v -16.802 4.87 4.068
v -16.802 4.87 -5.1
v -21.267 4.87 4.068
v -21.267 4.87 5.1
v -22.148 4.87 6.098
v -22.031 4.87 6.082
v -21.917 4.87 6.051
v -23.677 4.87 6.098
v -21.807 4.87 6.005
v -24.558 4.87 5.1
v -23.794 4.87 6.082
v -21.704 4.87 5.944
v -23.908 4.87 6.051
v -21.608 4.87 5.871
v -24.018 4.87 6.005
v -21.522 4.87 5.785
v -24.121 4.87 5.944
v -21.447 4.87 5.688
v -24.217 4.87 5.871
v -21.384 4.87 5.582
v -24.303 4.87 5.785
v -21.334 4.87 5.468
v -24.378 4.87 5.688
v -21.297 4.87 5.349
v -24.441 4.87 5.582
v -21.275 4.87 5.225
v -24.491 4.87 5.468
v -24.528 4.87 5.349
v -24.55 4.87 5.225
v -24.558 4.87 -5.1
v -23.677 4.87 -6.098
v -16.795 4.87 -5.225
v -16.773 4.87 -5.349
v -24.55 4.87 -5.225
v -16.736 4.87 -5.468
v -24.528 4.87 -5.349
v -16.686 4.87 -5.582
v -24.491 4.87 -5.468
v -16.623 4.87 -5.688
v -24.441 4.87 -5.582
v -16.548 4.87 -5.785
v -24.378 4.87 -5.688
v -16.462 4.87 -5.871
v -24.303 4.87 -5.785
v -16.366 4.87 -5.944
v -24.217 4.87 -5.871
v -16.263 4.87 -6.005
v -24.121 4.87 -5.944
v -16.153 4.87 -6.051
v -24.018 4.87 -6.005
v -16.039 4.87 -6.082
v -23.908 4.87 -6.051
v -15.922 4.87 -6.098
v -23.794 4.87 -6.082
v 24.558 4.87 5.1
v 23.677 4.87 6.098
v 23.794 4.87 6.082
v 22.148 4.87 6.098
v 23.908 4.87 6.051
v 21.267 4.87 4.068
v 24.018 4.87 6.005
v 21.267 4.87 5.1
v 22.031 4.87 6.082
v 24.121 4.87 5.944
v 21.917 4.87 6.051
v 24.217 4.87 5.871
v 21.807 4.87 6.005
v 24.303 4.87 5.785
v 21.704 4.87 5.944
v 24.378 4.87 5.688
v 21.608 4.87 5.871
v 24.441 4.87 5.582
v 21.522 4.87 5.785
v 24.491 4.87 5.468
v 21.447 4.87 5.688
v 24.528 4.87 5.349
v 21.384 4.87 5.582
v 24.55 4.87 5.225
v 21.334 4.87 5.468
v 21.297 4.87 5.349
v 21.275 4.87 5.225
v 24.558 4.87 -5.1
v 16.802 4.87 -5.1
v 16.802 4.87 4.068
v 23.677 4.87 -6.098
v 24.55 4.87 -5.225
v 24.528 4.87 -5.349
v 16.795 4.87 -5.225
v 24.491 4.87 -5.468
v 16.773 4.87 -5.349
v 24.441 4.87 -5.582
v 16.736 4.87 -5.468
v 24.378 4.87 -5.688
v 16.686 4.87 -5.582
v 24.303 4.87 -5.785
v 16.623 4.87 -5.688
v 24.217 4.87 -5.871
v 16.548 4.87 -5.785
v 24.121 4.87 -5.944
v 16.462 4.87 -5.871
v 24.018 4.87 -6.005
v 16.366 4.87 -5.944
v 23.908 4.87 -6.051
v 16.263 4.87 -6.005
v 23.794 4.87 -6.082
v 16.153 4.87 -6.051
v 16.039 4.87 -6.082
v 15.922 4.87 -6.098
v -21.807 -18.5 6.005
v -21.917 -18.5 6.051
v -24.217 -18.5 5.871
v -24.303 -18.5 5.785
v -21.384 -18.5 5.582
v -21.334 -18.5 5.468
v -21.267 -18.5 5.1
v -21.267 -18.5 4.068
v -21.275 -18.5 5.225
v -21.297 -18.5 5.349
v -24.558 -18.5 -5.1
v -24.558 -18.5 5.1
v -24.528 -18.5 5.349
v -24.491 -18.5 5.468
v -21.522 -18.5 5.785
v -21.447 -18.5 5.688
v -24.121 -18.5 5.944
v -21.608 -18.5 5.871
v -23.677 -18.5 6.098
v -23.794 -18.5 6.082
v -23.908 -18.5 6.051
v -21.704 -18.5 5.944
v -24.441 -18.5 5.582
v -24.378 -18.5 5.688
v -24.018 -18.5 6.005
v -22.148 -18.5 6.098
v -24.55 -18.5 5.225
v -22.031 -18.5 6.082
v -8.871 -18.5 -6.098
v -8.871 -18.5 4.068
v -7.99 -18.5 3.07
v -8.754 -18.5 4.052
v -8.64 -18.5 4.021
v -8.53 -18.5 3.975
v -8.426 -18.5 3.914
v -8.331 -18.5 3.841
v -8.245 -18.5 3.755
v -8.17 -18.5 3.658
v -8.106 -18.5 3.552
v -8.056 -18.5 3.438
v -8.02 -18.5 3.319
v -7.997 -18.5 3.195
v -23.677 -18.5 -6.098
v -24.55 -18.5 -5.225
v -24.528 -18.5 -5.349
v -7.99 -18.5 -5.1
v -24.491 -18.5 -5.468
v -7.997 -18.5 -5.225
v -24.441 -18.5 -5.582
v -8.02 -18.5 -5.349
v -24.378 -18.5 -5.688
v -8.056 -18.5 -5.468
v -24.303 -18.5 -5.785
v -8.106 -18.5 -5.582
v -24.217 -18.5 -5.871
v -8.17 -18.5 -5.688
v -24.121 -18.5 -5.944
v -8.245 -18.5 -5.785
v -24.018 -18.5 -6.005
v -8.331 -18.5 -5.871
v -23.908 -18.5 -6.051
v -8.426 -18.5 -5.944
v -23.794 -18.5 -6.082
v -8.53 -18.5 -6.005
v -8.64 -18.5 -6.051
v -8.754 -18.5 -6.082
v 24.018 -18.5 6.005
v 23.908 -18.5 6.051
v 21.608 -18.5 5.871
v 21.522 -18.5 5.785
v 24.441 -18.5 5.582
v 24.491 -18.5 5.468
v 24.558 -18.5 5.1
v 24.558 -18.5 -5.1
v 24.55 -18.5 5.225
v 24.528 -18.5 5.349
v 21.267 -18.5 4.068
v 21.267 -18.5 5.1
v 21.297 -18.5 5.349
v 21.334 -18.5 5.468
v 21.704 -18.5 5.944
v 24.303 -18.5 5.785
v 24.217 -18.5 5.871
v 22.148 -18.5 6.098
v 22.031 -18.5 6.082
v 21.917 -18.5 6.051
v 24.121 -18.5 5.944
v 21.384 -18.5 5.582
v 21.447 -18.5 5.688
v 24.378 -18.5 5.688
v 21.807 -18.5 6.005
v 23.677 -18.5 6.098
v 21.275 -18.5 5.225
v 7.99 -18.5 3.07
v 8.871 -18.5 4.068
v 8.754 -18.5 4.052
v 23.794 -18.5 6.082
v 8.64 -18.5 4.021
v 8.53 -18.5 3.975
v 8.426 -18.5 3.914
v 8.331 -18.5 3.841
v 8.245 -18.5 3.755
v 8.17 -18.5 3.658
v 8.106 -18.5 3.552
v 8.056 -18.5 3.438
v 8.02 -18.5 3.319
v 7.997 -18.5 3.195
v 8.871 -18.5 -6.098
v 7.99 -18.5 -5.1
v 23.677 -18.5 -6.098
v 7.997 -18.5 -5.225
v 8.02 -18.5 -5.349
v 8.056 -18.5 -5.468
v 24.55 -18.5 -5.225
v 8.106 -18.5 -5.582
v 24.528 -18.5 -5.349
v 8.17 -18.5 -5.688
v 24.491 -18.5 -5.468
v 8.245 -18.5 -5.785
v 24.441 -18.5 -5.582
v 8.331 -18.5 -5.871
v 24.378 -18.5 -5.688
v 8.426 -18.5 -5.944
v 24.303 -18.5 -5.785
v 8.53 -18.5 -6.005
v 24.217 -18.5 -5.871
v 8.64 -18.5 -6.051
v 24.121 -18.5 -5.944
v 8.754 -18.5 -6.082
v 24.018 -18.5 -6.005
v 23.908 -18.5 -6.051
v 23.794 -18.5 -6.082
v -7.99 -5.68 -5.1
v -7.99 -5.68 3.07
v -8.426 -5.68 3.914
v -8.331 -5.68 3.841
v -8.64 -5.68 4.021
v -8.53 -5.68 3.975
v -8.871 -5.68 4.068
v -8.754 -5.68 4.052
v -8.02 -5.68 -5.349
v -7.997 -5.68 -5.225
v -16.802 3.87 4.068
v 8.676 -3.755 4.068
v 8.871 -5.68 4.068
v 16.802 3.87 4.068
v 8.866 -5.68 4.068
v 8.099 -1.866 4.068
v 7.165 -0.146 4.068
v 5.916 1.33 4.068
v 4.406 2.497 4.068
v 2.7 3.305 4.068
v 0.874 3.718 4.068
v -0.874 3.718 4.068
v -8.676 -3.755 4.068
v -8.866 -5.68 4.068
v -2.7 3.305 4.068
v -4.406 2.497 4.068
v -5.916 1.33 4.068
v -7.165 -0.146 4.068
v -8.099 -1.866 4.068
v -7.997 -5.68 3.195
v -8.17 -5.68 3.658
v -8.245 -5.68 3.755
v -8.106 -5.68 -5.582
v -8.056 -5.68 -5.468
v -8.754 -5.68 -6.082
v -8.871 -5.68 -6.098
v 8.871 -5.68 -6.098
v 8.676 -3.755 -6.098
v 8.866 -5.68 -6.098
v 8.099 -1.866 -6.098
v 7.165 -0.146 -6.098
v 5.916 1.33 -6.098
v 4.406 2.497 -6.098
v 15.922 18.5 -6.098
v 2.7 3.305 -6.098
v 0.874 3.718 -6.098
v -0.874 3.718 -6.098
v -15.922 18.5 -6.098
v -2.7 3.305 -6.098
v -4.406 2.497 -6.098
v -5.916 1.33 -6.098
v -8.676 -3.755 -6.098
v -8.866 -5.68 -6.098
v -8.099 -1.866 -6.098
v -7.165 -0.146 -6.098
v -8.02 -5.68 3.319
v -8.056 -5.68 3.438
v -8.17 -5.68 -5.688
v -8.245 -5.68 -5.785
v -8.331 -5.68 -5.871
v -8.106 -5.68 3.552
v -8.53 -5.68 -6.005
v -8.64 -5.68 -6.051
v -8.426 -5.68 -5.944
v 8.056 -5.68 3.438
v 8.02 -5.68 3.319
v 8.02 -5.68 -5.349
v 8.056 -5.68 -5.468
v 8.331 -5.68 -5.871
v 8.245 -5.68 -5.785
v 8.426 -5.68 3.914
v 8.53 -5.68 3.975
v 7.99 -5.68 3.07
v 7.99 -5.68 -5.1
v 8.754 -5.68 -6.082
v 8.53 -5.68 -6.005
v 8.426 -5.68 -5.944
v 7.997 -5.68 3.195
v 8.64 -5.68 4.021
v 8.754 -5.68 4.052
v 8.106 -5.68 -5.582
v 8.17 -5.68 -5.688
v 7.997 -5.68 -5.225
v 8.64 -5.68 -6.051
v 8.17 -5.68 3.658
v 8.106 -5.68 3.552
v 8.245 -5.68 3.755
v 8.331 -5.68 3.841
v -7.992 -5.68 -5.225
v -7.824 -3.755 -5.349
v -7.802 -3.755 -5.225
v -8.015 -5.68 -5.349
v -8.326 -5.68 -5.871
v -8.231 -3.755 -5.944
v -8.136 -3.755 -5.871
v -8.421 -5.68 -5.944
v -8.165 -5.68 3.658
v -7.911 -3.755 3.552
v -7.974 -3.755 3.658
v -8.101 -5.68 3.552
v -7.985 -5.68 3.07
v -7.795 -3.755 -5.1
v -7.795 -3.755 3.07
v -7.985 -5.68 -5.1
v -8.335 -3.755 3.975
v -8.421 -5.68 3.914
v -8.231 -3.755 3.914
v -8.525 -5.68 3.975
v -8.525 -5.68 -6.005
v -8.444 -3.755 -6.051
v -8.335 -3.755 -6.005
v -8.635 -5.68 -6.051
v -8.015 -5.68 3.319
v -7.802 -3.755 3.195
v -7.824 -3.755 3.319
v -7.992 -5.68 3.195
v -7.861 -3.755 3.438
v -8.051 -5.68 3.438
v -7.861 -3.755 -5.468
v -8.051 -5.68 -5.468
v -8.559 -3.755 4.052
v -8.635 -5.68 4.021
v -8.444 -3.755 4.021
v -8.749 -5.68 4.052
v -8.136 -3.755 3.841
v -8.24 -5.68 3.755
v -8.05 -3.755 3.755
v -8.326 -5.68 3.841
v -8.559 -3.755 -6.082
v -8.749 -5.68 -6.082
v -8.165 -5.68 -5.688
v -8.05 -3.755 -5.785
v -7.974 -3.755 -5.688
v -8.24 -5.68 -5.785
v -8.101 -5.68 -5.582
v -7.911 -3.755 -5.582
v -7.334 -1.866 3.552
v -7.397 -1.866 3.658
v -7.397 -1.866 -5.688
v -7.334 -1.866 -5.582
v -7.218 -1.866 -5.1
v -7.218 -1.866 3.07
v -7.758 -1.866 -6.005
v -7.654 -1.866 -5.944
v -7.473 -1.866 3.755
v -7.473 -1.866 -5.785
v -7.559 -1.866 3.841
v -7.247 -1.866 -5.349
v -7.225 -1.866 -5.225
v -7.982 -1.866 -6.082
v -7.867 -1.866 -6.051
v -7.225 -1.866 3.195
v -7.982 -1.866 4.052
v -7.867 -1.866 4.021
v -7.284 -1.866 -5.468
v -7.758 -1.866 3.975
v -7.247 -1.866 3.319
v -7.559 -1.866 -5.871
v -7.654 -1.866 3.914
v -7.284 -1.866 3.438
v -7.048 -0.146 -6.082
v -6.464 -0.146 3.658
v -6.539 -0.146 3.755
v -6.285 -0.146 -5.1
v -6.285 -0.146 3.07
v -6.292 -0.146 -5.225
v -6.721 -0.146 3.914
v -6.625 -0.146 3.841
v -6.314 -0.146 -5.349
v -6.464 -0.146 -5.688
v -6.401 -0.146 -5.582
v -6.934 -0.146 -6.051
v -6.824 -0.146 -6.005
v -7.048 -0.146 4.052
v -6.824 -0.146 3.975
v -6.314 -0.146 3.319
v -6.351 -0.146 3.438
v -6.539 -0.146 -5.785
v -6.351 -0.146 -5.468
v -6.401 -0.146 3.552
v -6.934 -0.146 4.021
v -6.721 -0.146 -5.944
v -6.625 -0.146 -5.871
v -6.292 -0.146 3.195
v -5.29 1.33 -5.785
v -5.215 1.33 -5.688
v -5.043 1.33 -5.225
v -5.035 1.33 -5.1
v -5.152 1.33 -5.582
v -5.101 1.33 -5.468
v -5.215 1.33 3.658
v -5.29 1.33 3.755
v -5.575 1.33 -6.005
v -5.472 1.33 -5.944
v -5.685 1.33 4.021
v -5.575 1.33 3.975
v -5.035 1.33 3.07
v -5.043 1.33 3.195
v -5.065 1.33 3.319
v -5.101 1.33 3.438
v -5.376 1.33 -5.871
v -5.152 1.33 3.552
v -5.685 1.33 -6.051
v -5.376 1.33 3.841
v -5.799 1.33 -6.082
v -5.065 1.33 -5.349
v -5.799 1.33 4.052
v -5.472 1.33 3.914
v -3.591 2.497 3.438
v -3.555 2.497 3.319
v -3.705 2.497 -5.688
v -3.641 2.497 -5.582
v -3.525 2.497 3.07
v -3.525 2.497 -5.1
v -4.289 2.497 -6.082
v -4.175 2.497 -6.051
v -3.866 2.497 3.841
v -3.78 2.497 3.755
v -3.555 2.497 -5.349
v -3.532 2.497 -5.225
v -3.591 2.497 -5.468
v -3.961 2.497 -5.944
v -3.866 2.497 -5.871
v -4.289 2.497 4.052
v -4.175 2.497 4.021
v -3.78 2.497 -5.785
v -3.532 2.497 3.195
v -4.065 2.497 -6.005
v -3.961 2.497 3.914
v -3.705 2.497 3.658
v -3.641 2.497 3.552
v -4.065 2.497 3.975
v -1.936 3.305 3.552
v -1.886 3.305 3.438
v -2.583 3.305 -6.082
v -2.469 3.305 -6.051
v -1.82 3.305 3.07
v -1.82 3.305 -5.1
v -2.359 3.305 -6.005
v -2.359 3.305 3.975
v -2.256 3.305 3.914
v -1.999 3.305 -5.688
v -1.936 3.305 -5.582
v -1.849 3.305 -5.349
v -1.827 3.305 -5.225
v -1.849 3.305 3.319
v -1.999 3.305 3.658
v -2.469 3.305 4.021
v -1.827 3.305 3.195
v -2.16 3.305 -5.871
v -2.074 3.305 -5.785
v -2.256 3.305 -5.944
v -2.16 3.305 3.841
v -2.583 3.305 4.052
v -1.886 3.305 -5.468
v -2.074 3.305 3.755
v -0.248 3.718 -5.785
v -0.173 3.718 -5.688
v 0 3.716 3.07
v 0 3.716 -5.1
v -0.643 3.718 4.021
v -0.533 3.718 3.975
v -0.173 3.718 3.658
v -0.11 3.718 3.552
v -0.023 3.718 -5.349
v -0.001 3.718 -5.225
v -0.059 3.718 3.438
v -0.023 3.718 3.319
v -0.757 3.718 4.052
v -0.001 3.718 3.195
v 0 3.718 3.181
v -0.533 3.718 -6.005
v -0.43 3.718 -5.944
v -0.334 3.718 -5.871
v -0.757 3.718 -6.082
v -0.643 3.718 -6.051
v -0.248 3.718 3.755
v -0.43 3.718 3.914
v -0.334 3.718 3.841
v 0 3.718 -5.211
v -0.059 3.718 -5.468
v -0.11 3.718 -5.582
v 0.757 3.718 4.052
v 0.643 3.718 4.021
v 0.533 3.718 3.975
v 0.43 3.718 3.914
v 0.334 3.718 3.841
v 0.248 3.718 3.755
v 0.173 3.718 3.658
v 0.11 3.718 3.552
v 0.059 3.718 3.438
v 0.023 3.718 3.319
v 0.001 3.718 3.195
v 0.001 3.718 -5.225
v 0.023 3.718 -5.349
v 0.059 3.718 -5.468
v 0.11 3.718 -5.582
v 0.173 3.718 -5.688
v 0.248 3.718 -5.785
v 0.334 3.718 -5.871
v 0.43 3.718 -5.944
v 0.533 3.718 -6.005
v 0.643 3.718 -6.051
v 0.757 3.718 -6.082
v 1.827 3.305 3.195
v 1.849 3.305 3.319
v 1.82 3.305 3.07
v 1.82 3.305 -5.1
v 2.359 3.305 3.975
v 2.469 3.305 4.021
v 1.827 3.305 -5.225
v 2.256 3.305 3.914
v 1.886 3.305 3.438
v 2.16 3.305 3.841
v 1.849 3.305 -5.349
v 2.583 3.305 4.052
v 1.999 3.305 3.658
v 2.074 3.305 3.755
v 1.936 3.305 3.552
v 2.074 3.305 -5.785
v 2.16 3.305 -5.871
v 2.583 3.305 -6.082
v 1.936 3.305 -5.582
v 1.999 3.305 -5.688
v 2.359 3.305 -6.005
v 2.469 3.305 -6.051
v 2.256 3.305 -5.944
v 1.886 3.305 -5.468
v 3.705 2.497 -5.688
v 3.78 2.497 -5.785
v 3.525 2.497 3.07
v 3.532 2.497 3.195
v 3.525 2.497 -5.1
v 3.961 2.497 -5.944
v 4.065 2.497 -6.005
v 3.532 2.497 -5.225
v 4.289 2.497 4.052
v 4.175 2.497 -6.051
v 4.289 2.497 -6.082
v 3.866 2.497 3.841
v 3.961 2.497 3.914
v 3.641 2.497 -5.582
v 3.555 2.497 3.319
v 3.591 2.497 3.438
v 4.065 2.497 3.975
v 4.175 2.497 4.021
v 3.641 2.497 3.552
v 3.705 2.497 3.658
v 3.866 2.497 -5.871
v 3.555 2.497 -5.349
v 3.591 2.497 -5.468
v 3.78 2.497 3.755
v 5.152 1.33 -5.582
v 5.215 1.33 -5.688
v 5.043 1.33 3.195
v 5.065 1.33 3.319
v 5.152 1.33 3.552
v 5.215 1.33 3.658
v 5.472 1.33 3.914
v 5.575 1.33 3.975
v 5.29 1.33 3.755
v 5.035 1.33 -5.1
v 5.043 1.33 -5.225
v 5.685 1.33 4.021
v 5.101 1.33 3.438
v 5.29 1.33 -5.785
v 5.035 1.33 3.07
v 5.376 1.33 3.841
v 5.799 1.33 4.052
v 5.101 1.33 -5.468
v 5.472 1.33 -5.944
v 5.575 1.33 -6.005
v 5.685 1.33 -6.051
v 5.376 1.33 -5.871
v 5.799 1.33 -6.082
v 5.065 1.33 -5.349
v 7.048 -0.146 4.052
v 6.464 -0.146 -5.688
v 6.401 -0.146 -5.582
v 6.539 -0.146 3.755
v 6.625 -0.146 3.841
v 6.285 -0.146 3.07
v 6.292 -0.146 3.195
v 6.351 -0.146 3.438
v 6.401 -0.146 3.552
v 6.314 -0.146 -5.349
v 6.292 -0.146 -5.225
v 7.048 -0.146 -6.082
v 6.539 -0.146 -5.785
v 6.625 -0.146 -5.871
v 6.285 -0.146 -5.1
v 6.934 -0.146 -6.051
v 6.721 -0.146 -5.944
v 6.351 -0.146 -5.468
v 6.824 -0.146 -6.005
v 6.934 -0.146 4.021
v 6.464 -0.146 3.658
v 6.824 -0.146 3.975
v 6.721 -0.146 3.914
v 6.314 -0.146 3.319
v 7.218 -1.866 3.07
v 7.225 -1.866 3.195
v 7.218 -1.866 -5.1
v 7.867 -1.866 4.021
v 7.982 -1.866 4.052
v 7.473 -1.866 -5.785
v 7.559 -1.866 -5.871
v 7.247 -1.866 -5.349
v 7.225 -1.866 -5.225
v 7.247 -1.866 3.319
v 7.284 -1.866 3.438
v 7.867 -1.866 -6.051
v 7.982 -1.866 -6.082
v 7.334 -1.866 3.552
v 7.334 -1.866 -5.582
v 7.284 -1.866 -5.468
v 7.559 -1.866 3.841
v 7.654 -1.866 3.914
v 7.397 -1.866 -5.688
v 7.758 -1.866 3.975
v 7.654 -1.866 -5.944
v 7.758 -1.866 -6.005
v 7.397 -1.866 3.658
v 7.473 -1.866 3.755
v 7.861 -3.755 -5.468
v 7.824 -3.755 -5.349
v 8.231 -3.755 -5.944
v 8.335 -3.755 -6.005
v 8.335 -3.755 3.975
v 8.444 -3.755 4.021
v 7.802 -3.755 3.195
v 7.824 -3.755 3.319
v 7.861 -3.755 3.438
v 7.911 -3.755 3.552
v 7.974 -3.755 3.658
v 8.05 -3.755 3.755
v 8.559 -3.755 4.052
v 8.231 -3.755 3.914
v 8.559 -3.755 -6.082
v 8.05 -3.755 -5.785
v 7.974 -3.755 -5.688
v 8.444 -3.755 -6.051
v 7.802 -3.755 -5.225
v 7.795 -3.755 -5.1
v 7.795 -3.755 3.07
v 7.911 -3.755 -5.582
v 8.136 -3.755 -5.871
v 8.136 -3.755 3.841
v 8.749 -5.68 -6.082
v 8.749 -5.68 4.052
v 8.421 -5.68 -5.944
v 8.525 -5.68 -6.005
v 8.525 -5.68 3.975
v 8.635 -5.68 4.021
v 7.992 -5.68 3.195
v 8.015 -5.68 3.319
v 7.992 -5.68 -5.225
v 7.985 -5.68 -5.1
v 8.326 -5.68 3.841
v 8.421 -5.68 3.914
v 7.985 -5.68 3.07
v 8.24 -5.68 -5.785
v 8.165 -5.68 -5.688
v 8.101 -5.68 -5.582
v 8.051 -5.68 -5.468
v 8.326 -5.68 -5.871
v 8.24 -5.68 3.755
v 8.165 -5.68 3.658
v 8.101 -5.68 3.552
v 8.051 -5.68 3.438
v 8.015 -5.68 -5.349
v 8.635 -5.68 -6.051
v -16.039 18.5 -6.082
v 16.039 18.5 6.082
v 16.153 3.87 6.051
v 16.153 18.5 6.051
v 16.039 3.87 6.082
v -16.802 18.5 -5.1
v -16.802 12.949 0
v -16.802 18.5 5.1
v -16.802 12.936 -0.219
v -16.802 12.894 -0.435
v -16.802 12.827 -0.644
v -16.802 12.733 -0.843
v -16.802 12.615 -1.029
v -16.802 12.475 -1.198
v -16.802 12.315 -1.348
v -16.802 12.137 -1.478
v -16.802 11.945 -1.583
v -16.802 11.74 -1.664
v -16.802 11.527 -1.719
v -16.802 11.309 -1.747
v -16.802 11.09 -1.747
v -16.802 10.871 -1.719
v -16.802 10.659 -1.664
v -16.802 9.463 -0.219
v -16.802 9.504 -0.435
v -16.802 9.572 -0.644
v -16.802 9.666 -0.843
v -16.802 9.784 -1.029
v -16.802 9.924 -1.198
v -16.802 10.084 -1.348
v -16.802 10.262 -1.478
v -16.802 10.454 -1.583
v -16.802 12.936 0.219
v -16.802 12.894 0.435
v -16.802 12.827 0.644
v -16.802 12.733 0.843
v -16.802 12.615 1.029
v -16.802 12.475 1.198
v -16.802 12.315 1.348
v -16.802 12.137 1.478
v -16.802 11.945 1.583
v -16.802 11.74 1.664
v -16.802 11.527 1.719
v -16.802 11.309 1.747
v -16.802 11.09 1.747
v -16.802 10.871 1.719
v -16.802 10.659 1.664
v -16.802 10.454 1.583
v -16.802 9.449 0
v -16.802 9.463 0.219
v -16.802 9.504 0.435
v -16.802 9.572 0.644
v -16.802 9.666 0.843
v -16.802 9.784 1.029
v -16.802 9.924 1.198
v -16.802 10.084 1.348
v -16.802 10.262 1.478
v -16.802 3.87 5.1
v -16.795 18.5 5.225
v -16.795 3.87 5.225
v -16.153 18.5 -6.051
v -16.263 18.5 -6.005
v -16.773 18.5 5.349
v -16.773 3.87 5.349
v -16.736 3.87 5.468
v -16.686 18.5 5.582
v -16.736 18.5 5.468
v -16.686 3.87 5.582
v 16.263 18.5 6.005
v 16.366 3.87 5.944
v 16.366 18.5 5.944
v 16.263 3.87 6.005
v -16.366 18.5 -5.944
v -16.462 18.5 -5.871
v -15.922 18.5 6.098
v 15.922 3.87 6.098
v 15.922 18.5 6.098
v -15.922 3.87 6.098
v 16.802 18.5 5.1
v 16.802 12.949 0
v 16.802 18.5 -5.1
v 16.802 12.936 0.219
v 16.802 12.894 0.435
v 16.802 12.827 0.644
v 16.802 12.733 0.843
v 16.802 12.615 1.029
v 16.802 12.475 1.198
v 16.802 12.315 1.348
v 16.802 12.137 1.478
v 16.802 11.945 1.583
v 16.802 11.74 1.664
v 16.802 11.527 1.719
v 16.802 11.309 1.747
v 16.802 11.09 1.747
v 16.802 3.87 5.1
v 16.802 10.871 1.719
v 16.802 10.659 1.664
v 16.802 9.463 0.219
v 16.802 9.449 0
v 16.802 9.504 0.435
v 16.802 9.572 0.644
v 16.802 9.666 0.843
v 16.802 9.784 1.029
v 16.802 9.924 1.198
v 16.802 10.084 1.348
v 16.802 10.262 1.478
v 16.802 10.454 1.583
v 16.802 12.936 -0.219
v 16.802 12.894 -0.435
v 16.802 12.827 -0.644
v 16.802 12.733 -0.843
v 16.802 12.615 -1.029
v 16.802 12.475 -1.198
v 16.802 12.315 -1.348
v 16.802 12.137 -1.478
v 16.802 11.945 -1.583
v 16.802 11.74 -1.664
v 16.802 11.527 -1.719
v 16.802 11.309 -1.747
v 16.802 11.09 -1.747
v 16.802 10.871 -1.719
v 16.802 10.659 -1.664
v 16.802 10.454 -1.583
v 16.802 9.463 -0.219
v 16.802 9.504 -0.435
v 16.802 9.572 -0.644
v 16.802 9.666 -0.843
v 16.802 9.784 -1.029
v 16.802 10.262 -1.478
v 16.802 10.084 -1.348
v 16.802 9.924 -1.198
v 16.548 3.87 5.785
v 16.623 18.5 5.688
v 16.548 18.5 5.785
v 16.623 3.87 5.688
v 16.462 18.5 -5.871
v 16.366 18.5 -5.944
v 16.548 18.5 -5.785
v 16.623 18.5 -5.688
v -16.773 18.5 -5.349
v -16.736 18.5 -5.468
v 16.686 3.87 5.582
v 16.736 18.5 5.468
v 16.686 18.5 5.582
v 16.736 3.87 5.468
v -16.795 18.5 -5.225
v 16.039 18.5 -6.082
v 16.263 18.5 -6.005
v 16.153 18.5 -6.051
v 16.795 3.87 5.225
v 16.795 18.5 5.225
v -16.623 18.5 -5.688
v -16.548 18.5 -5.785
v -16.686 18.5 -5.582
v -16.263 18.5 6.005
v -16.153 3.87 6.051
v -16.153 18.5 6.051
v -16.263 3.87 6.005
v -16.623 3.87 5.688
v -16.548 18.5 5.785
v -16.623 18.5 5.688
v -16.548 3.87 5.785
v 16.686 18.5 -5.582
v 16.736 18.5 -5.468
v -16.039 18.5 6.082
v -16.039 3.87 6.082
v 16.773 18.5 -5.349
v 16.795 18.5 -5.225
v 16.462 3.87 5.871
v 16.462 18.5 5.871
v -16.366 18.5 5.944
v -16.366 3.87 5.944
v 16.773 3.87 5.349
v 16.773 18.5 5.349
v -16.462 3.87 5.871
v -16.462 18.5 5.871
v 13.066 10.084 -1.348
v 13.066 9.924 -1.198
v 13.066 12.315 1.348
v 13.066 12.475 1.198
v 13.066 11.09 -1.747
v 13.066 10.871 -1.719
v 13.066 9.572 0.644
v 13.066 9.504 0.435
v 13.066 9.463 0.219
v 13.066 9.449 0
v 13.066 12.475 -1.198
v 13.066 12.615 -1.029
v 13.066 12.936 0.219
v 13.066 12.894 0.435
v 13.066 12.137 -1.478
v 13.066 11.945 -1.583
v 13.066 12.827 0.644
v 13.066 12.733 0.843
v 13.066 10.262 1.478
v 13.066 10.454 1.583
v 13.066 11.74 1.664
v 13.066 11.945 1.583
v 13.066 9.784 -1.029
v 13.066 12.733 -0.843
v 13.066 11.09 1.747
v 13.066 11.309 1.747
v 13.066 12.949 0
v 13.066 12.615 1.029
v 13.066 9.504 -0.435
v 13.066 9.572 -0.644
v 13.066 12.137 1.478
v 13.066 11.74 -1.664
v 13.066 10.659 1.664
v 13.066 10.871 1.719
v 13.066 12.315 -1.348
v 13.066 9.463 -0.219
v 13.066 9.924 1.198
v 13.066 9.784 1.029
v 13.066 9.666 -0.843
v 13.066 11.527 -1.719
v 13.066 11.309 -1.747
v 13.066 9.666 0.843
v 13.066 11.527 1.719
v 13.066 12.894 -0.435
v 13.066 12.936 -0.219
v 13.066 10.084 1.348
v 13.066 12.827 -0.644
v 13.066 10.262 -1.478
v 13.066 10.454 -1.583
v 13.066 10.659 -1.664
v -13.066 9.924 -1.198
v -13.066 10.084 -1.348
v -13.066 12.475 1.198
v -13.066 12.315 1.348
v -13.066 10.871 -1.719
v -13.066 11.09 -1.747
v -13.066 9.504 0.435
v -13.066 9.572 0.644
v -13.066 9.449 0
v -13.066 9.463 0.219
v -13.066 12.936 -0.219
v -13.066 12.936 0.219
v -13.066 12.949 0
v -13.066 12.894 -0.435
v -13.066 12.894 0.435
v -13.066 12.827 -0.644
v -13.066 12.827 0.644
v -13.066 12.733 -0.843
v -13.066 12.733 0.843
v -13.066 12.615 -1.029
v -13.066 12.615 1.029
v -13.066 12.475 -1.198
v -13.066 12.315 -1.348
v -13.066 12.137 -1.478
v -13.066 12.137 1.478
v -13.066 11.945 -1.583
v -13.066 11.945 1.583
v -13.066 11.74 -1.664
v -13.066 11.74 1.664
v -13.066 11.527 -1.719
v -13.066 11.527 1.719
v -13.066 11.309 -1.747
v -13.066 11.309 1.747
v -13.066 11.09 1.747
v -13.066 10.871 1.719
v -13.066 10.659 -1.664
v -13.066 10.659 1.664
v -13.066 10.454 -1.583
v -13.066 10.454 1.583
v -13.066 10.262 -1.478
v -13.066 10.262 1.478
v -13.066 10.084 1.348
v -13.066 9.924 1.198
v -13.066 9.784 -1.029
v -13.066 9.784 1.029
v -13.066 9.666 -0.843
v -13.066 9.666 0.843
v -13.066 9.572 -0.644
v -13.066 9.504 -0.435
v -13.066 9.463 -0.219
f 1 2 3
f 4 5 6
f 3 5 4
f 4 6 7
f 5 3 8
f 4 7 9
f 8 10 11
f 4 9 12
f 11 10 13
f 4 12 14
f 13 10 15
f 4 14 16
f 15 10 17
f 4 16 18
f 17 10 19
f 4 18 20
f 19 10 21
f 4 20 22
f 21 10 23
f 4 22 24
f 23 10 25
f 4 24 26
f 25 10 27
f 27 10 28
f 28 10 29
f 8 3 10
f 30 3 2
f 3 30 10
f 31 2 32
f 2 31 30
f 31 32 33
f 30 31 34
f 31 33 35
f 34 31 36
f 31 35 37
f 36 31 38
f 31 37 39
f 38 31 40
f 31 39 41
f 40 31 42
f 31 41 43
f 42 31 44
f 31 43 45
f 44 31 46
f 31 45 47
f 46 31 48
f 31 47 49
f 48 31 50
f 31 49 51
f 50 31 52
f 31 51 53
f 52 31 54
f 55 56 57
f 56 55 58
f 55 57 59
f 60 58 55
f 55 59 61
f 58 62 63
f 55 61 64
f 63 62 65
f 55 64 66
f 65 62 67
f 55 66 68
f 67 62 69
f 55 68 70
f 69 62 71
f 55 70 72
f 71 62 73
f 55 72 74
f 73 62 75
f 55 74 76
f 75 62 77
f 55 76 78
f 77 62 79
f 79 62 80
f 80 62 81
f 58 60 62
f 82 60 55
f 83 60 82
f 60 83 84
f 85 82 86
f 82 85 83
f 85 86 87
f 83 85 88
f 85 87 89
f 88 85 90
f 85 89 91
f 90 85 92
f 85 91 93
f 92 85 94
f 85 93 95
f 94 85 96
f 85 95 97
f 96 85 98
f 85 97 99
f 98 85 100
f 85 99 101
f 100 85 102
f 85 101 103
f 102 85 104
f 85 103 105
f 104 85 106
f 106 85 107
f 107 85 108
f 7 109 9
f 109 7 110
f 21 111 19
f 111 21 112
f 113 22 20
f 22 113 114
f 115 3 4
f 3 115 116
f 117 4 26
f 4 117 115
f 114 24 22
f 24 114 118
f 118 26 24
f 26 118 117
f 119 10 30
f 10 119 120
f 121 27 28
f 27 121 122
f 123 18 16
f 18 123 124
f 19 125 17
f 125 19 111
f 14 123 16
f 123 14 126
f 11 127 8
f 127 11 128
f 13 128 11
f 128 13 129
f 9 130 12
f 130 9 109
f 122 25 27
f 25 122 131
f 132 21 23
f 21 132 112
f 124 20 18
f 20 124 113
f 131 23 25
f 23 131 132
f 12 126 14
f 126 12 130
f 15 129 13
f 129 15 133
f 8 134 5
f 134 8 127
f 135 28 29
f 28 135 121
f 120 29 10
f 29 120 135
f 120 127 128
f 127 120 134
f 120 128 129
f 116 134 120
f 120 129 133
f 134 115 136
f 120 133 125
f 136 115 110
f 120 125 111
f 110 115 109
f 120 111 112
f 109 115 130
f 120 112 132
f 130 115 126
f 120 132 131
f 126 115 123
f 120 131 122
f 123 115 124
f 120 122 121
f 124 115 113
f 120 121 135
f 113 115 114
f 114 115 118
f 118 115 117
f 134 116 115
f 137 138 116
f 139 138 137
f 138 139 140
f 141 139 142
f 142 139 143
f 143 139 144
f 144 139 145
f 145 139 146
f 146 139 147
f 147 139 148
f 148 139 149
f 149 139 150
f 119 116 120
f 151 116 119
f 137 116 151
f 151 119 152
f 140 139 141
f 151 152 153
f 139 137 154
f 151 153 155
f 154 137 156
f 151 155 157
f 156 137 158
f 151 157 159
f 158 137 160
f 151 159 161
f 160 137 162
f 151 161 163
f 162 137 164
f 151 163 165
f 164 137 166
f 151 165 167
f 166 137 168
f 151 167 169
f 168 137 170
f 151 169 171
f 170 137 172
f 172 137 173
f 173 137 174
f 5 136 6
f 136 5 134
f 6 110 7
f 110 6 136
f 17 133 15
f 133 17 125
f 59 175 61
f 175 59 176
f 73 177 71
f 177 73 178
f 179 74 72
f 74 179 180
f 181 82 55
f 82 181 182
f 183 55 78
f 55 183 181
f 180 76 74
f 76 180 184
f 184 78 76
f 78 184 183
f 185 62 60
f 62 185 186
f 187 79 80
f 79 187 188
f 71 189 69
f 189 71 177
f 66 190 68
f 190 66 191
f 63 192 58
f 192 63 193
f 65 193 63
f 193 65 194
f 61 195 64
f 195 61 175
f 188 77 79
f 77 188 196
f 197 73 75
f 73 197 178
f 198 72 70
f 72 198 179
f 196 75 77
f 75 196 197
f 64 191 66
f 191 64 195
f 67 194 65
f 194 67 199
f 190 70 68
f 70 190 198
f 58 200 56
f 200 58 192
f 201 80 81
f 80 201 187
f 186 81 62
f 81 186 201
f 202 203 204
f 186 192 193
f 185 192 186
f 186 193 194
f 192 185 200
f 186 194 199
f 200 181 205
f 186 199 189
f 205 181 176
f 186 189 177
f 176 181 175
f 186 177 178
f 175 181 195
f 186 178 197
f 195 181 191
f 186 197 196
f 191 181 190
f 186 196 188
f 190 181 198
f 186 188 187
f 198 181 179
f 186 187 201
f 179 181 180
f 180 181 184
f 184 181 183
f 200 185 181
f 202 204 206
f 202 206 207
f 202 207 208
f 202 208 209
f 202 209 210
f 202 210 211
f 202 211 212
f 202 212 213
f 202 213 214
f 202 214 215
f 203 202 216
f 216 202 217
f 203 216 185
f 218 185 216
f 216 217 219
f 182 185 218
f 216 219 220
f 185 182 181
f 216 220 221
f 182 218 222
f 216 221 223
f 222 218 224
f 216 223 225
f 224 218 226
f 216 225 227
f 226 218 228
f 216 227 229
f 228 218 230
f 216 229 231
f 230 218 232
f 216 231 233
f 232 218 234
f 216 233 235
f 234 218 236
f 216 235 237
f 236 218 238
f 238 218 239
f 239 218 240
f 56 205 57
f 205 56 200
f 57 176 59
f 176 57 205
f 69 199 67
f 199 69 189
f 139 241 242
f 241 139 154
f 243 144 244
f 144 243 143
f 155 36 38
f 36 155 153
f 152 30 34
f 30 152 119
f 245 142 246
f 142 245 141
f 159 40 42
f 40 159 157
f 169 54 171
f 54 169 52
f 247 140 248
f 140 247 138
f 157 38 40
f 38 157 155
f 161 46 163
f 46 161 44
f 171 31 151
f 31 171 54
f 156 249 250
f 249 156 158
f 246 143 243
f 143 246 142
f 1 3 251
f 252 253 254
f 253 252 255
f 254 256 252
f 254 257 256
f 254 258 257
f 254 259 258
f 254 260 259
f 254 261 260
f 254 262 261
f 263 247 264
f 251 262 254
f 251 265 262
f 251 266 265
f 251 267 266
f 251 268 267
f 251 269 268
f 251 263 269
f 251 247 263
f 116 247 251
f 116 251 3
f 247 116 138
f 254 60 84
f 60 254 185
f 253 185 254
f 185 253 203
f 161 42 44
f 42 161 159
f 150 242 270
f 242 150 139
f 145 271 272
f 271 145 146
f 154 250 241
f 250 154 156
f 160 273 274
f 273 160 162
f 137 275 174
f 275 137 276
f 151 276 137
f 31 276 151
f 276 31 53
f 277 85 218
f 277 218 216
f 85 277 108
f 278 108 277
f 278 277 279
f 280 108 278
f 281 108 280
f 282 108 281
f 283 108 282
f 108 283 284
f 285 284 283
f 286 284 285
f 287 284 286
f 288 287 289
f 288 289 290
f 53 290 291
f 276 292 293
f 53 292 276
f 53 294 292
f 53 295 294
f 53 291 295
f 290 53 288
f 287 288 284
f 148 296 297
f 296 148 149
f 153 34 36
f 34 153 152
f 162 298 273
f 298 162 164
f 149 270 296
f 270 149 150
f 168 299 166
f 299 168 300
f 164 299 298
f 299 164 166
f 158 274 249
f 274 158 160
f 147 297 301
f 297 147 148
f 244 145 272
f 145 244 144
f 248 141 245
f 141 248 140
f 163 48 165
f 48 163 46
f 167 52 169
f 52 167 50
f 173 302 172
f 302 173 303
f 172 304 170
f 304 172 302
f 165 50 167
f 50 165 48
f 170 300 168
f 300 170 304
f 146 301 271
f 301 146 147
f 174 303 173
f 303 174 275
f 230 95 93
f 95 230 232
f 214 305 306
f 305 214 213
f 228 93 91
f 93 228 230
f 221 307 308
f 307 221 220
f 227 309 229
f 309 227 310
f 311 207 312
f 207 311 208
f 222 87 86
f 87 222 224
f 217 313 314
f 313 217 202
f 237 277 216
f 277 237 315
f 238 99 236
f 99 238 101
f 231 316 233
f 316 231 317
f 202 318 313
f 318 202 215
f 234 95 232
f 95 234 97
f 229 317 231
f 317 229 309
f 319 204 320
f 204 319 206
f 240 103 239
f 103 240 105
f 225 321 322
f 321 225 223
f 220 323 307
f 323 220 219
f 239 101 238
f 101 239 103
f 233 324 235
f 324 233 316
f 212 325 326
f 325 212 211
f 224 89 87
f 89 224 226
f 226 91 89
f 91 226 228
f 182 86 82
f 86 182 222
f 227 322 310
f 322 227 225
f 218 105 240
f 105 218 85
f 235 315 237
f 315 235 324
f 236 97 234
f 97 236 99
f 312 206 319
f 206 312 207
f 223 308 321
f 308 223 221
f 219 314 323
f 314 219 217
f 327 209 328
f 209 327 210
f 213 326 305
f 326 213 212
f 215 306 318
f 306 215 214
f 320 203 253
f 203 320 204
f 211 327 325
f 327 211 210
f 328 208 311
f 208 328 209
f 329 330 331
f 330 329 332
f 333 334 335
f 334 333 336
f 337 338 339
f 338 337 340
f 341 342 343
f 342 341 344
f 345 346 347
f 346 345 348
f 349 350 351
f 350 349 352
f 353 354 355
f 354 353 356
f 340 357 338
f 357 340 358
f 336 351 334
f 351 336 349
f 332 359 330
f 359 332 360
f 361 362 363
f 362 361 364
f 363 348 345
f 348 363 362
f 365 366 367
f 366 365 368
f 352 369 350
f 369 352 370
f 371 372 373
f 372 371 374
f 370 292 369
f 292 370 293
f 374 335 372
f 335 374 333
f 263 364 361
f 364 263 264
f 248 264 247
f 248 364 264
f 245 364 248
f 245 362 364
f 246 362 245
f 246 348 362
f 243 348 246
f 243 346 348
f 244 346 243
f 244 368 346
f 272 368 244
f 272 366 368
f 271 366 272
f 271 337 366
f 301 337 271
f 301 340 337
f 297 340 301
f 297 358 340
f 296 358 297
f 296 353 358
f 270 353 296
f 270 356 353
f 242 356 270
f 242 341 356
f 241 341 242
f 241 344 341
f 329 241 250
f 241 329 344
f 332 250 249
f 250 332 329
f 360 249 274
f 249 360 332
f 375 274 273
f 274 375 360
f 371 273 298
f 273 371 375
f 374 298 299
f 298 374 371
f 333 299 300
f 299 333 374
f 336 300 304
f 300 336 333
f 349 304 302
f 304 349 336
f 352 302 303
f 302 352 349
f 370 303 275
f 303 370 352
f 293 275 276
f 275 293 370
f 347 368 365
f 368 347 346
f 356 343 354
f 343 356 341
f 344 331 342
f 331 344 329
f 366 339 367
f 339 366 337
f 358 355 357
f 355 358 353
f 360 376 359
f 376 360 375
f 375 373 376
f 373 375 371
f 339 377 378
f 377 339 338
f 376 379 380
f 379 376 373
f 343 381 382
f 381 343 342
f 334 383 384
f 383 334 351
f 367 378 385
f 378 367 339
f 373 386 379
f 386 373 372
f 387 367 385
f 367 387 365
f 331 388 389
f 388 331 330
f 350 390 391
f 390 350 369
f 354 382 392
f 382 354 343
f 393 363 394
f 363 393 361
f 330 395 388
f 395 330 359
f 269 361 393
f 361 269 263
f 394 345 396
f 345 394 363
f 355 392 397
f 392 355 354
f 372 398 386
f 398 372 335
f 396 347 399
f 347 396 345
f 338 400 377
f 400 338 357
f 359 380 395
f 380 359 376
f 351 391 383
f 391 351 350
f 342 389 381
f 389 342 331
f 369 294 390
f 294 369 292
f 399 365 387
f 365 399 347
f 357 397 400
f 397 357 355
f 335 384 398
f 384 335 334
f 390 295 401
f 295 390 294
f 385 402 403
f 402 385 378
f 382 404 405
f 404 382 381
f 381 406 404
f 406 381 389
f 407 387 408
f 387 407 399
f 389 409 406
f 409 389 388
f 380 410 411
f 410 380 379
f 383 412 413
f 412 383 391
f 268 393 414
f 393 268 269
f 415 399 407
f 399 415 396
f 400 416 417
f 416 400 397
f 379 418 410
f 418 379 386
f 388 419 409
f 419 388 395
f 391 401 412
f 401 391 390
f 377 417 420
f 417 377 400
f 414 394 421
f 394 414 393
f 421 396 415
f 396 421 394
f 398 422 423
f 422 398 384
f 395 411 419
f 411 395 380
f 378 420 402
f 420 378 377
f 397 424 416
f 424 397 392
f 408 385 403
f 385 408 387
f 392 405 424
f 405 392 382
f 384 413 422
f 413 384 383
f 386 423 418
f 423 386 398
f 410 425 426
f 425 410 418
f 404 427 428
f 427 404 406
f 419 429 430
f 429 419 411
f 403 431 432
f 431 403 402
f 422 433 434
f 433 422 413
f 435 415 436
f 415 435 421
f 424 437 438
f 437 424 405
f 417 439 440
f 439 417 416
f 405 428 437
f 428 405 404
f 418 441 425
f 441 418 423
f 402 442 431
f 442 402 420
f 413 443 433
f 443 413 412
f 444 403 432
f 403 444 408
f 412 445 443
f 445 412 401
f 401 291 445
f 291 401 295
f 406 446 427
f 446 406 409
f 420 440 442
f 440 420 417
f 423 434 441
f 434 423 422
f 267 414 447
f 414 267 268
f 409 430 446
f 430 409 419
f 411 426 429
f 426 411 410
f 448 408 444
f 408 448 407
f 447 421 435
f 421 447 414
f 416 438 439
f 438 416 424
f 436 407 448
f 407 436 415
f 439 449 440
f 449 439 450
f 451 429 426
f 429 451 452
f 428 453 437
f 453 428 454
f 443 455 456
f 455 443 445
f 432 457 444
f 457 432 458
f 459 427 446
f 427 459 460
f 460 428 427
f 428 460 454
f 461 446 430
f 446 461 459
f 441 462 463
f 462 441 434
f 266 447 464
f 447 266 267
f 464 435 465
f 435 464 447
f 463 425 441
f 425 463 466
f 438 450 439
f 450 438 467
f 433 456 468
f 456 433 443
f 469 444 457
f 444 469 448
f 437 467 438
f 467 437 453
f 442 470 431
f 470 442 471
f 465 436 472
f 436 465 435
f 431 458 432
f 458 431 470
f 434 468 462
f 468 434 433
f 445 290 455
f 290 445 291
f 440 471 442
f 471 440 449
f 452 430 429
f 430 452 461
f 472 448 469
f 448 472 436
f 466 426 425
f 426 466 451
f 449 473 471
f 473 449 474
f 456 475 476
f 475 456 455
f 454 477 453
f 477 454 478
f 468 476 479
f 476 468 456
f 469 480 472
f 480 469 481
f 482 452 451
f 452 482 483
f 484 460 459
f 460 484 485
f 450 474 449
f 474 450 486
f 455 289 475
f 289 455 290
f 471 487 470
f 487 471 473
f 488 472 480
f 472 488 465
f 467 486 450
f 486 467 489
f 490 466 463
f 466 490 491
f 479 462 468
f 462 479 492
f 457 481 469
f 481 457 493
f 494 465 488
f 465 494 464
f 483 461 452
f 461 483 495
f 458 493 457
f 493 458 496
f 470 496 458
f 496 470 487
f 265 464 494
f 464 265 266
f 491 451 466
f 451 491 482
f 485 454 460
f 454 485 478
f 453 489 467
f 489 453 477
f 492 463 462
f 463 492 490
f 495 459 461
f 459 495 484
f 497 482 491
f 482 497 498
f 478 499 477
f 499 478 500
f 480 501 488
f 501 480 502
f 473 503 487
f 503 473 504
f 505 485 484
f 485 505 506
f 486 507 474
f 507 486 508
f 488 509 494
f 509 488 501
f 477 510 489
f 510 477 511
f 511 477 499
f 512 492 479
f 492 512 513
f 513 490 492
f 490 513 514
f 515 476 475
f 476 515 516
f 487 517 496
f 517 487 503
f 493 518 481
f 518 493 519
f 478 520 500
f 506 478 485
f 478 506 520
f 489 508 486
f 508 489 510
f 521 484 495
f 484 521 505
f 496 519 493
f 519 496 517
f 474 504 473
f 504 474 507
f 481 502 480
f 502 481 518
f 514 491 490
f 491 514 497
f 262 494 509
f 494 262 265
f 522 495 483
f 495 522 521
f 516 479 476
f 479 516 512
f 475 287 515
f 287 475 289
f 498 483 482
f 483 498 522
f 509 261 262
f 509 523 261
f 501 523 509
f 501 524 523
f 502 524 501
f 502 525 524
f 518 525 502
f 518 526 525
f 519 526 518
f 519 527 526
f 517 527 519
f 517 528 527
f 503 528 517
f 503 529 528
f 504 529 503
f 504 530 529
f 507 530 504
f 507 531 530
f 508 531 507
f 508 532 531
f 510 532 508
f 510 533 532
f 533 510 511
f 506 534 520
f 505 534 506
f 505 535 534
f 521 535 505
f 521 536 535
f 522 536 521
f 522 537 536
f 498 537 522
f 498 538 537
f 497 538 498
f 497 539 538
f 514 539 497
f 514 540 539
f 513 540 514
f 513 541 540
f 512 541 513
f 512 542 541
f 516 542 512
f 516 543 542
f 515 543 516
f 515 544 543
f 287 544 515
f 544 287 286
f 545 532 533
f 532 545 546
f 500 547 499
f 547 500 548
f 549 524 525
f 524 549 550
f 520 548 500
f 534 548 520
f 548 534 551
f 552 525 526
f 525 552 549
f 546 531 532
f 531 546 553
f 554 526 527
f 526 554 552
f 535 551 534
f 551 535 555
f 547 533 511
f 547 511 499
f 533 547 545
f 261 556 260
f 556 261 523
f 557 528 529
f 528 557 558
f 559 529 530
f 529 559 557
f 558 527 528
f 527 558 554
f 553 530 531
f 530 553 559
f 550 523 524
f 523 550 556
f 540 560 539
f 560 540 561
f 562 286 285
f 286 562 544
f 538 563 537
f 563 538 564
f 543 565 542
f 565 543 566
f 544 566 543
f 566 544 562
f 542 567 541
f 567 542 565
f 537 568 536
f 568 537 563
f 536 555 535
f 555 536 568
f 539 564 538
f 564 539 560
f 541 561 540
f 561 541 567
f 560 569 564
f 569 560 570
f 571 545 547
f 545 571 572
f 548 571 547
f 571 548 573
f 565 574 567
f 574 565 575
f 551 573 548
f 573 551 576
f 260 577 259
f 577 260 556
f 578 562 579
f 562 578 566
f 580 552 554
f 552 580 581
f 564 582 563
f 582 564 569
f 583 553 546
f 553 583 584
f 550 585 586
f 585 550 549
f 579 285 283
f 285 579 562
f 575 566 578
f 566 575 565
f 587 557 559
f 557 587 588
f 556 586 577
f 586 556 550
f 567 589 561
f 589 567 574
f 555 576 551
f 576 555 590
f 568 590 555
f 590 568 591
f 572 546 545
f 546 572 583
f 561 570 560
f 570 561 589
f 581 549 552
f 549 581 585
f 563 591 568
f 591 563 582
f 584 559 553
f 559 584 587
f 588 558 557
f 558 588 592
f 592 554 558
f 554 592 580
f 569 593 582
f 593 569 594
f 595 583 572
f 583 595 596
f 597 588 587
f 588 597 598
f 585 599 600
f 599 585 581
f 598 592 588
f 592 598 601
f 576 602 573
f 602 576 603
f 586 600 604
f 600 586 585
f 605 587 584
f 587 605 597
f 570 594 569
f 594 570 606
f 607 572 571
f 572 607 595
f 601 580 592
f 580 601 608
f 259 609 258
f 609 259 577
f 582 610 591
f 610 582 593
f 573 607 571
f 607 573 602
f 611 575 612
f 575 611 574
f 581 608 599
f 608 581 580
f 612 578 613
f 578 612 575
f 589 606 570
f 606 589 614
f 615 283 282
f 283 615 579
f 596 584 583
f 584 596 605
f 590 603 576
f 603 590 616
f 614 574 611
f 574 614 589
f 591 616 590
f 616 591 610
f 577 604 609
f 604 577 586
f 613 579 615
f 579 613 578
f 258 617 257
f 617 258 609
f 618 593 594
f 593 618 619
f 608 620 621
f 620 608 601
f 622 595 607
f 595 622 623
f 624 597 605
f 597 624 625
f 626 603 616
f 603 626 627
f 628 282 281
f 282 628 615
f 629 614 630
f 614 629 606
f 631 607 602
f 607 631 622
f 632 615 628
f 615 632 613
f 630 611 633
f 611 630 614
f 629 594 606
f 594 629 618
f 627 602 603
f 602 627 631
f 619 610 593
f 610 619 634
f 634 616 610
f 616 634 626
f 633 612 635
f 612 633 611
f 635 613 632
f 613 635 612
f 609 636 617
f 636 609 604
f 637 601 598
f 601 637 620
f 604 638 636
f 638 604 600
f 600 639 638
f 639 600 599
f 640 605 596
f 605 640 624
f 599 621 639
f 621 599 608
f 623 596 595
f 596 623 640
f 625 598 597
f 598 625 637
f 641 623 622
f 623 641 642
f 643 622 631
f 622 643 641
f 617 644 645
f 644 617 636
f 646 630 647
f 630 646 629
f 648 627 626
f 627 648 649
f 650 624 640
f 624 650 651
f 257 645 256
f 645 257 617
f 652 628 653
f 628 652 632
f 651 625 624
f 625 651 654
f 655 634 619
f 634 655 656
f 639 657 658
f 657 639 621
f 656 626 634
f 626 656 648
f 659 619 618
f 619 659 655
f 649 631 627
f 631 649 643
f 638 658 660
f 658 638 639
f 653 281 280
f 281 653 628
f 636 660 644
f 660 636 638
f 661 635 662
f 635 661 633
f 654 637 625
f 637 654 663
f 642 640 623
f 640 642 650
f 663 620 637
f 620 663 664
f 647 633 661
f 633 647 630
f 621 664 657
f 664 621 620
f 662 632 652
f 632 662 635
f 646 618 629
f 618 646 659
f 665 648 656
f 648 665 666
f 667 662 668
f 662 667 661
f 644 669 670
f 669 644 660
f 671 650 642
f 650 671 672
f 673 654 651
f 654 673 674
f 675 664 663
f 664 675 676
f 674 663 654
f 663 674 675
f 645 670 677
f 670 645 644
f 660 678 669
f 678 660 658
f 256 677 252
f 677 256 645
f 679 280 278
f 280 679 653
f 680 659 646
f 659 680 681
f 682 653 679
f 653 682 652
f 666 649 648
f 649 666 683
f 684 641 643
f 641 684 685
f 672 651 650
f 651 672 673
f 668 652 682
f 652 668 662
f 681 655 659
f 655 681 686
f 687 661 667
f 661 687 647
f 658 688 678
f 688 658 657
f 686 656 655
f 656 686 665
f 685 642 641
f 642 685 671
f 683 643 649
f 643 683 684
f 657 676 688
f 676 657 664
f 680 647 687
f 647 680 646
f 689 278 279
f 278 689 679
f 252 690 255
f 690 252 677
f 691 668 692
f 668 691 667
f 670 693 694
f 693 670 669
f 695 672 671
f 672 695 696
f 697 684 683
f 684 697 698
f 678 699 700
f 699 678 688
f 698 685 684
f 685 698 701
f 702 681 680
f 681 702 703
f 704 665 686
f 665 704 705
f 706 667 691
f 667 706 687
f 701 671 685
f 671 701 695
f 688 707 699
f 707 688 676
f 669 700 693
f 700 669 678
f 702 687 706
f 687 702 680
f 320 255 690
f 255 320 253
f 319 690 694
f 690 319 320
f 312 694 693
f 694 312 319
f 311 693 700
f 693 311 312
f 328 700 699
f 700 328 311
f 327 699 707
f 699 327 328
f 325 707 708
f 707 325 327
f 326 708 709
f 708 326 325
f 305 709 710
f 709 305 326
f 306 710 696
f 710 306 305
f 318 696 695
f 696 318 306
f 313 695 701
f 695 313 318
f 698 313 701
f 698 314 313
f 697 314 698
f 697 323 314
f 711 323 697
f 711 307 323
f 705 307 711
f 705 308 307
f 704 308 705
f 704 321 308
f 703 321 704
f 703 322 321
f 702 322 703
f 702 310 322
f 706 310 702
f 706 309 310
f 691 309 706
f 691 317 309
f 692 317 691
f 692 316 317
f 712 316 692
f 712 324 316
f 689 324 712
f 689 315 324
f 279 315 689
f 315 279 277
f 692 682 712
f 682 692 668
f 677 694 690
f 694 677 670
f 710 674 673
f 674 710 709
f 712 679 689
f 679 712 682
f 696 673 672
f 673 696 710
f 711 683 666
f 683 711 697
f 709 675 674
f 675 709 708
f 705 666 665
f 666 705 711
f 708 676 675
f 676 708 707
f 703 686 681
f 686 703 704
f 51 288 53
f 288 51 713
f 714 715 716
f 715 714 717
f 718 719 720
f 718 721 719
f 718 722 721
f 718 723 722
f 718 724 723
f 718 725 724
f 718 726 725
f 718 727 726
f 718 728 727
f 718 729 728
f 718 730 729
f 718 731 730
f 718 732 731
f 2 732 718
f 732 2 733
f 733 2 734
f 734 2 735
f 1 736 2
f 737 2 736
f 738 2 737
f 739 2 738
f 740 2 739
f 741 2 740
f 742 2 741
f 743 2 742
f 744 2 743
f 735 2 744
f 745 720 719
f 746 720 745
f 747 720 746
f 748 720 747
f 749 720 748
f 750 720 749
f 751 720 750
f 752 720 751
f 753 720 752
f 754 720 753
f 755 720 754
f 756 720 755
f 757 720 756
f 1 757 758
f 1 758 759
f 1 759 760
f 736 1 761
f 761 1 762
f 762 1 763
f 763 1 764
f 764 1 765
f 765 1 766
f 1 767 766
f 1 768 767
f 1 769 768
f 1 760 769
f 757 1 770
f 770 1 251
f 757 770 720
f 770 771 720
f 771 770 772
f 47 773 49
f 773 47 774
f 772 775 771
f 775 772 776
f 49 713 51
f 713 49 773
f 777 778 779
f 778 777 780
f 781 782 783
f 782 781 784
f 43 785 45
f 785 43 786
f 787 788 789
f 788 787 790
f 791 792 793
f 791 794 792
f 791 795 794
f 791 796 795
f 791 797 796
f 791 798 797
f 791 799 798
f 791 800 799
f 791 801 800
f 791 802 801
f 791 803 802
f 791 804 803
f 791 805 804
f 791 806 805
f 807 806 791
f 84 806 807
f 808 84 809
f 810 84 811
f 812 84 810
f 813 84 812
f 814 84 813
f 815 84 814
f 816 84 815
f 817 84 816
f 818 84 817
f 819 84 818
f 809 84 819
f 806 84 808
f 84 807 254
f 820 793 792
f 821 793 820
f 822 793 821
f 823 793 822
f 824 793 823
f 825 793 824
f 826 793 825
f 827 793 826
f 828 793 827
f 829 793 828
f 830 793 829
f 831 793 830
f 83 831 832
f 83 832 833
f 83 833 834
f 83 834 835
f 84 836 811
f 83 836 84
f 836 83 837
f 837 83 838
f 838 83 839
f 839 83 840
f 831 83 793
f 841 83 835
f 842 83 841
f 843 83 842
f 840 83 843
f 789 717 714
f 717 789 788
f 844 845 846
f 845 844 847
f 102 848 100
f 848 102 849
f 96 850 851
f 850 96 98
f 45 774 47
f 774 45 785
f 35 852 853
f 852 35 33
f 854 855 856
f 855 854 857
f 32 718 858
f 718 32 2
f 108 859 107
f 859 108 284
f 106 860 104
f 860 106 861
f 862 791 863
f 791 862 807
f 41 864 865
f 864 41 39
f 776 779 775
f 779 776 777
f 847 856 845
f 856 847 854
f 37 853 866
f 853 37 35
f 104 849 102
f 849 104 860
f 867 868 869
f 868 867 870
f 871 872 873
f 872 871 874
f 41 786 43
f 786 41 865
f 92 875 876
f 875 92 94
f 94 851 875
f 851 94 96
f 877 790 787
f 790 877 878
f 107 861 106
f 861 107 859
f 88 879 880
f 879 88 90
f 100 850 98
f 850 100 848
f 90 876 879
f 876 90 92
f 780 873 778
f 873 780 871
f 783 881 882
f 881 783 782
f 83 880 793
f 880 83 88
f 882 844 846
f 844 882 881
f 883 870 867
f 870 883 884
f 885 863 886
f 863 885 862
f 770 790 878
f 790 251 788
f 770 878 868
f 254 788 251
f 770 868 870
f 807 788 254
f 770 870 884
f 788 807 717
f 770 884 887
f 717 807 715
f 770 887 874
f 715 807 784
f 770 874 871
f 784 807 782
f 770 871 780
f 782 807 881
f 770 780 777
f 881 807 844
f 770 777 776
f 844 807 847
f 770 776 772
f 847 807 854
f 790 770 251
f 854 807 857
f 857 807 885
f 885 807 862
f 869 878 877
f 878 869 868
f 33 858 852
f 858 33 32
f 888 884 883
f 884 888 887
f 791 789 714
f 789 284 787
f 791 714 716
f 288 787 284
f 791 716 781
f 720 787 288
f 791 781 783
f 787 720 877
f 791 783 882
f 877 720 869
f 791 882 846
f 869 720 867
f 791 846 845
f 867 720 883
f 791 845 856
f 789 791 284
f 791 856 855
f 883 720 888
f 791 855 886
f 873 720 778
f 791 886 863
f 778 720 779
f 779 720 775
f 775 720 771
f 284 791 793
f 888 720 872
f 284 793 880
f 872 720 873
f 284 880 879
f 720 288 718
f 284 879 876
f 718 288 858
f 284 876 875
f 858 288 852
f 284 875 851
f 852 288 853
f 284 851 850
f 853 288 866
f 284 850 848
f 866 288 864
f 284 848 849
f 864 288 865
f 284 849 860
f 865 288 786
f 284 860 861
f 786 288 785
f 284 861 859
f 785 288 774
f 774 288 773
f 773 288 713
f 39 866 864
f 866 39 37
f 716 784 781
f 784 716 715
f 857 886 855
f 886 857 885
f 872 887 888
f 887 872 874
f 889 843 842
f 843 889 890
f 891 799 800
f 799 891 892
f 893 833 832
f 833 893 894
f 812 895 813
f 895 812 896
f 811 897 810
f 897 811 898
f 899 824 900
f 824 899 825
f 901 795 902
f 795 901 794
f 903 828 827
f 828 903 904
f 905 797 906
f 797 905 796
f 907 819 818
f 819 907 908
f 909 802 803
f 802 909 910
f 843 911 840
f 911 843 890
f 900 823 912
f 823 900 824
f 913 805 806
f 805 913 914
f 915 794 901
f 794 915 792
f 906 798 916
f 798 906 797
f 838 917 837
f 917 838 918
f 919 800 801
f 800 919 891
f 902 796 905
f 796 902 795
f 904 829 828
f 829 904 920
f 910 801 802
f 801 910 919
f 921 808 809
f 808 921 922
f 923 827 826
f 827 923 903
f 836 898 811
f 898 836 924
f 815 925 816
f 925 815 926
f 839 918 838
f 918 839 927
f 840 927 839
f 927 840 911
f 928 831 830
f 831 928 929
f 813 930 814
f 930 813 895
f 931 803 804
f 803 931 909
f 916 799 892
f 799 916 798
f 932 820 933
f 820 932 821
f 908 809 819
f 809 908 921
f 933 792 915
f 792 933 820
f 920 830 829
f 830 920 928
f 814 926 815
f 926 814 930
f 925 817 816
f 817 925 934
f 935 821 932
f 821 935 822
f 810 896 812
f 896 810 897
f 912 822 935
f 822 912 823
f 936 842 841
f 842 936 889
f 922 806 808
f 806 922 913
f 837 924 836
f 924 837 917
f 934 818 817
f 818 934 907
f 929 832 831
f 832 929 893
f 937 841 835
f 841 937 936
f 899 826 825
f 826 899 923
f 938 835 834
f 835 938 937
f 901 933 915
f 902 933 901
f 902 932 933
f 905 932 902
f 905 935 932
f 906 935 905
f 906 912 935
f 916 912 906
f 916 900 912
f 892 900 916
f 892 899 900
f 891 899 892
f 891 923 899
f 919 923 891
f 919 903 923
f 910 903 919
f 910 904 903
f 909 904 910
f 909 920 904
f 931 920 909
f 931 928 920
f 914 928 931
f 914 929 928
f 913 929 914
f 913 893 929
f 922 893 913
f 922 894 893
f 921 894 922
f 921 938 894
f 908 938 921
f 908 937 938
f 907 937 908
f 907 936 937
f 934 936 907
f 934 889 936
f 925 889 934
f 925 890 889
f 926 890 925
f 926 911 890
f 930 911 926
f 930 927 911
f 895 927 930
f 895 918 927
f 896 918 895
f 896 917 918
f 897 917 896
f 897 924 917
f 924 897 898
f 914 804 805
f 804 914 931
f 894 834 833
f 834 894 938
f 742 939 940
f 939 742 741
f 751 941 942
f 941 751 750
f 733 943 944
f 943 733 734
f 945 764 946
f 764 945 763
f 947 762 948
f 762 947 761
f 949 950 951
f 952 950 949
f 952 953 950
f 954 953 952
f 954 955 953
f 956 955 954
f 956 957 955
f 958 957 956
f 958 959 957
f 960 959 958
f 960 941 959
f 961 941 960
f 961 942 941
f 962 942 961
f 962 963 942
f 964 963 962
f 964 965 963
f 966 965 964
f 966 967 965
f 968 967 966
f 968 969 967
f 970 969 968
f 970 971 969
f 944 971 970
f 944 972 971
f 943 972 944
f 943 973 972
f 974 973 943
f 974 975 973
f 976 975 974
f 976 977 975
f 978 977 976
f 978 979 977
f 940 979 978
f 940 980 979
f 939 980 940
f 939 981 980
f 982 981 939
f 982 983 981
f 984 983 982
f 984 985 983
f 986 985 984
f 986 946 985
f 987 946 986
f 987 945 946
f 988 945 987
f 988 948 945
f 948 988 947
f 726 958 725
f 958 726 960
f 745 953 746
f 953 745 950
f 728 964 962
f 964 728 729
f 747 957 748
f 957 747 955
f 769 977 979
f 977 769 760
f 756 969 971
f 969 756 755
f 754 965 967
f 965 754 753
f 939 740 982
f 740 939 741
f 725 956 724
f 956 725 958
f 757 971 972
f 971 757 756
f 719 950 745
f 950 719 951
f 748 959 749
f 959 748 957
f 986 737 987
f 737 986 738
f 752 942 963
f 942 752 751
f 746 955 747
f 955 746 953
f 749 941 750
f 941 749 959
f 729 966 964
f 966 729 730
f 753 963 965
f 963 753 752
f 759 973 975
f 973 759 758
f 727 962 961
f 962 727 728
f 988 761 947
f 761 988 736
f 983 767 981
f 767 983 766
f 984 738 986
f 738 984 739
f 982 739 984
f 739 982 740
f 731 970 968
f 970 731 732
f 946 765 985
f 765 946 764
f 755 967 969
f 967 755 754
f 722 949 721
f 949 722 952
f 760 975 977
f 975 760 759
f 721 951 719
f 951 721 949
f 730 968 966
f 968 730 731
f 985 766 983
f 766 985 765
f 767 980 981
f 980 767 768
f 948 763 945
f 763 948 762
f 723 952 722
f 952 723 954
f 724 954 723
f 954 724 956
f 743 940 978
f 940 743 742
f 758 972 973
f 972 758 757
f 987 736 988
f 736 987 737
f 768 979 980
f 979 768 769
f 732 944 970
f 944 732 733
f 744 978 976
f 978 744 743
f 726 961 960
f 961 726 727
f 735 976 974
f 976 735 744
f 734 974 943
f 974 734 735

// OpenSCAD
pumpHolderWidth=50.25;
pumpHolderHeight=36;//38.26;
pumpHolderThickness=10.20;


semiCircleDiameter=19; //16.36;
semiCircleRadius=semiCircleDiameter/2;

semiCircleHeight=26.54;
semiCircleThickness=7.23;

recBlockHeight=13.63;
recBlockWidth=8.25;

offsetThickness=2.03;



sideScrewRadius=1.75;
sideScrewHeight=4;
sideScrewOffsetRatio=0.38;

rotate([90,0,0]) scale([0.94,1,1]) translate([0,0,0]) difference(){
minkowski(){
    
difference(){
difference(){
difference(){
    cube([pumpHolderWidth,pumpHolderThickness,pumpHolderHeight],center=true);

    translate([0,(pumpHolderThickness/2)-(semiCircleThickness/2)+.001,(pumpHolderHeight/2) - (semiCircleHeight/2) + .5]) color("red") union(){
    rotate([90,0,0]) cylinder(h=pumpHolderThickness+5,r=semiCircleRadius, center=true);

    color("blue") translate([0,0,(semiCircleHeight/2)/2]) cube([semiCircleDiameter,pumpHolderThickness+5,semiCircleHeight/2 +.1],center=true);
    }
}

union(){
color("red") translate([(pumpHolderWidth/2)-(recBlockWidth/2),0,-(pumpHolderHeight/2)+(recBlockHeight/2)]) cube([recBlockWidth,pumpHolderThickness,recBlockHeight],center=true);

color("red") translate([-((pumpHolderWidth/2)-(recBlockWidth/2)),0,-(pumpHolderHeight/2)+(recBlockHeight/2)]) cube([recBlockWidth,pumpHolderThickness,recBlockHeight],center=true);
}

}

translate([0,(pumpHolderThickness/2)-(offsetThickness/2),(pumpHolderHeight-recBlockHeight)/2 - ((pumpHolderHeight/2) - recBlockHeight)]) color("black") cube([pumpHolderWidth-3,offsetThickness,pumpHolderHeight-recBlockHeight],center=true);

}


cylinder(1,center=true,$fn=50);
    
}
    union(){
        screwZAxisoffSet=2.15;
        color("red") translate([pumpHolderWidth/2 - (recBlockWidth/2) - (sideScrewHeight/2)-3.1,0,(pumpHolderHeight/2) + 1/2 -(pumpHolderHeight-recBlockHeight) - (sideScrewOffsetRatio*recBlockHeight) - screwZAxisoffSet]) rotate([0,90,0]) cylinder(h=sideScrewHeight,r=sideScrewRadius,$fn=50,center=true);

color("red") translate([-(pumpHolderWidth/2 - (recBlockWidth/2) - (sideScrewHeight/2)-3.1  ),0,(pumpHolderHeight/2) + 1/2 -(pumpHolderHeight-recBlockHeight) - (sideScrewOffsetRatio*recBlockHeight) - screwZAxisoffSet]) rotate([0,90,0]) cylinder(h=sideScrewHeight,r=sideScrewRadius,$fn=50,center=true);
    }
}



//
////pumpHolderWidth
////recBlockWidth/2 + (sideScrewHeight/2)
//color("red") translate([pumpHolderWidth/2 - (recBlockWidth/2) - (sideScrewHeight/2)-3.1,0,(pumpHolderHeight/2) + 1/2 -(pumpHolderHeight-recBlockHeight) - (sideScrewOffsetRatio*recBlockHeight)]) rotate([0,90,0]) cylinder(h=sideScrewHeight,r=sideScrewRadius,$fn=50,center=true);
//
//color("red") translate([-(pumpHolderWidth/2 - (recBlockWidth/2) - (sideScrewHeight/2)-3.1 ),0,(pumpHolderHeight/2) + 1/2 -(pumpHolderHeight-recBlockHeight) - (sideScrewOffsetRatio*recBlockHeight)]) rotate([0,90,0]) cylinder(h=sideScrewHeight,r=sideScrewRadius,$fn=50,center=true);
////cube([60,1,1],center=true);
//
//
//color("blue") translate([0,0,recBlockHeight/2]) cube([recBlockWidth, pumpHolderThickness,recBlockHeight],center=true);
//minkowski(){
//    translate([0,0,recBlockHeight/2]) cube([recBlockWidth, pumpHolderThickness,recBlockHeight],center=true);
//    cylinder(.00000000001,center=true,$fn=50);
//}



//-----------------------------------------

//translate([0,(pumpHolderThickness/2)-(offsetThickness/2),(pumpHolderHeight-recBlockHeight)/2 - ((pumpHolderHeight/2) - recBlockHeight)]) color("black") cube([pumpHolderWidth-3,offsetThickness,pumpHolderHeight-recBlockHeight],center=true);

//
//difference(){
//    %cube([pumpHolderWidth,pumpHolderThickness,pumpHolderHeight],center=true);
//
//    translate([0,(pumpHolderThickness/2)-(semiCircleThickness/2)+.001,(pumpHolderHeight/2) - (semiCircleHeight/2)]) color("red") union(){
//    rotate([90,0,0]) cylinder(h=pumpHolderThickness+5,r=semiCircleRadius, center=true);
//
//    color("red") translate([0,0,(semiCircleHeight/2)/2]) cube([semiCircleDiameter,pumpHolderThickness+5,semiCircleHeight/2 +.1],center=true);
//    }
//}
